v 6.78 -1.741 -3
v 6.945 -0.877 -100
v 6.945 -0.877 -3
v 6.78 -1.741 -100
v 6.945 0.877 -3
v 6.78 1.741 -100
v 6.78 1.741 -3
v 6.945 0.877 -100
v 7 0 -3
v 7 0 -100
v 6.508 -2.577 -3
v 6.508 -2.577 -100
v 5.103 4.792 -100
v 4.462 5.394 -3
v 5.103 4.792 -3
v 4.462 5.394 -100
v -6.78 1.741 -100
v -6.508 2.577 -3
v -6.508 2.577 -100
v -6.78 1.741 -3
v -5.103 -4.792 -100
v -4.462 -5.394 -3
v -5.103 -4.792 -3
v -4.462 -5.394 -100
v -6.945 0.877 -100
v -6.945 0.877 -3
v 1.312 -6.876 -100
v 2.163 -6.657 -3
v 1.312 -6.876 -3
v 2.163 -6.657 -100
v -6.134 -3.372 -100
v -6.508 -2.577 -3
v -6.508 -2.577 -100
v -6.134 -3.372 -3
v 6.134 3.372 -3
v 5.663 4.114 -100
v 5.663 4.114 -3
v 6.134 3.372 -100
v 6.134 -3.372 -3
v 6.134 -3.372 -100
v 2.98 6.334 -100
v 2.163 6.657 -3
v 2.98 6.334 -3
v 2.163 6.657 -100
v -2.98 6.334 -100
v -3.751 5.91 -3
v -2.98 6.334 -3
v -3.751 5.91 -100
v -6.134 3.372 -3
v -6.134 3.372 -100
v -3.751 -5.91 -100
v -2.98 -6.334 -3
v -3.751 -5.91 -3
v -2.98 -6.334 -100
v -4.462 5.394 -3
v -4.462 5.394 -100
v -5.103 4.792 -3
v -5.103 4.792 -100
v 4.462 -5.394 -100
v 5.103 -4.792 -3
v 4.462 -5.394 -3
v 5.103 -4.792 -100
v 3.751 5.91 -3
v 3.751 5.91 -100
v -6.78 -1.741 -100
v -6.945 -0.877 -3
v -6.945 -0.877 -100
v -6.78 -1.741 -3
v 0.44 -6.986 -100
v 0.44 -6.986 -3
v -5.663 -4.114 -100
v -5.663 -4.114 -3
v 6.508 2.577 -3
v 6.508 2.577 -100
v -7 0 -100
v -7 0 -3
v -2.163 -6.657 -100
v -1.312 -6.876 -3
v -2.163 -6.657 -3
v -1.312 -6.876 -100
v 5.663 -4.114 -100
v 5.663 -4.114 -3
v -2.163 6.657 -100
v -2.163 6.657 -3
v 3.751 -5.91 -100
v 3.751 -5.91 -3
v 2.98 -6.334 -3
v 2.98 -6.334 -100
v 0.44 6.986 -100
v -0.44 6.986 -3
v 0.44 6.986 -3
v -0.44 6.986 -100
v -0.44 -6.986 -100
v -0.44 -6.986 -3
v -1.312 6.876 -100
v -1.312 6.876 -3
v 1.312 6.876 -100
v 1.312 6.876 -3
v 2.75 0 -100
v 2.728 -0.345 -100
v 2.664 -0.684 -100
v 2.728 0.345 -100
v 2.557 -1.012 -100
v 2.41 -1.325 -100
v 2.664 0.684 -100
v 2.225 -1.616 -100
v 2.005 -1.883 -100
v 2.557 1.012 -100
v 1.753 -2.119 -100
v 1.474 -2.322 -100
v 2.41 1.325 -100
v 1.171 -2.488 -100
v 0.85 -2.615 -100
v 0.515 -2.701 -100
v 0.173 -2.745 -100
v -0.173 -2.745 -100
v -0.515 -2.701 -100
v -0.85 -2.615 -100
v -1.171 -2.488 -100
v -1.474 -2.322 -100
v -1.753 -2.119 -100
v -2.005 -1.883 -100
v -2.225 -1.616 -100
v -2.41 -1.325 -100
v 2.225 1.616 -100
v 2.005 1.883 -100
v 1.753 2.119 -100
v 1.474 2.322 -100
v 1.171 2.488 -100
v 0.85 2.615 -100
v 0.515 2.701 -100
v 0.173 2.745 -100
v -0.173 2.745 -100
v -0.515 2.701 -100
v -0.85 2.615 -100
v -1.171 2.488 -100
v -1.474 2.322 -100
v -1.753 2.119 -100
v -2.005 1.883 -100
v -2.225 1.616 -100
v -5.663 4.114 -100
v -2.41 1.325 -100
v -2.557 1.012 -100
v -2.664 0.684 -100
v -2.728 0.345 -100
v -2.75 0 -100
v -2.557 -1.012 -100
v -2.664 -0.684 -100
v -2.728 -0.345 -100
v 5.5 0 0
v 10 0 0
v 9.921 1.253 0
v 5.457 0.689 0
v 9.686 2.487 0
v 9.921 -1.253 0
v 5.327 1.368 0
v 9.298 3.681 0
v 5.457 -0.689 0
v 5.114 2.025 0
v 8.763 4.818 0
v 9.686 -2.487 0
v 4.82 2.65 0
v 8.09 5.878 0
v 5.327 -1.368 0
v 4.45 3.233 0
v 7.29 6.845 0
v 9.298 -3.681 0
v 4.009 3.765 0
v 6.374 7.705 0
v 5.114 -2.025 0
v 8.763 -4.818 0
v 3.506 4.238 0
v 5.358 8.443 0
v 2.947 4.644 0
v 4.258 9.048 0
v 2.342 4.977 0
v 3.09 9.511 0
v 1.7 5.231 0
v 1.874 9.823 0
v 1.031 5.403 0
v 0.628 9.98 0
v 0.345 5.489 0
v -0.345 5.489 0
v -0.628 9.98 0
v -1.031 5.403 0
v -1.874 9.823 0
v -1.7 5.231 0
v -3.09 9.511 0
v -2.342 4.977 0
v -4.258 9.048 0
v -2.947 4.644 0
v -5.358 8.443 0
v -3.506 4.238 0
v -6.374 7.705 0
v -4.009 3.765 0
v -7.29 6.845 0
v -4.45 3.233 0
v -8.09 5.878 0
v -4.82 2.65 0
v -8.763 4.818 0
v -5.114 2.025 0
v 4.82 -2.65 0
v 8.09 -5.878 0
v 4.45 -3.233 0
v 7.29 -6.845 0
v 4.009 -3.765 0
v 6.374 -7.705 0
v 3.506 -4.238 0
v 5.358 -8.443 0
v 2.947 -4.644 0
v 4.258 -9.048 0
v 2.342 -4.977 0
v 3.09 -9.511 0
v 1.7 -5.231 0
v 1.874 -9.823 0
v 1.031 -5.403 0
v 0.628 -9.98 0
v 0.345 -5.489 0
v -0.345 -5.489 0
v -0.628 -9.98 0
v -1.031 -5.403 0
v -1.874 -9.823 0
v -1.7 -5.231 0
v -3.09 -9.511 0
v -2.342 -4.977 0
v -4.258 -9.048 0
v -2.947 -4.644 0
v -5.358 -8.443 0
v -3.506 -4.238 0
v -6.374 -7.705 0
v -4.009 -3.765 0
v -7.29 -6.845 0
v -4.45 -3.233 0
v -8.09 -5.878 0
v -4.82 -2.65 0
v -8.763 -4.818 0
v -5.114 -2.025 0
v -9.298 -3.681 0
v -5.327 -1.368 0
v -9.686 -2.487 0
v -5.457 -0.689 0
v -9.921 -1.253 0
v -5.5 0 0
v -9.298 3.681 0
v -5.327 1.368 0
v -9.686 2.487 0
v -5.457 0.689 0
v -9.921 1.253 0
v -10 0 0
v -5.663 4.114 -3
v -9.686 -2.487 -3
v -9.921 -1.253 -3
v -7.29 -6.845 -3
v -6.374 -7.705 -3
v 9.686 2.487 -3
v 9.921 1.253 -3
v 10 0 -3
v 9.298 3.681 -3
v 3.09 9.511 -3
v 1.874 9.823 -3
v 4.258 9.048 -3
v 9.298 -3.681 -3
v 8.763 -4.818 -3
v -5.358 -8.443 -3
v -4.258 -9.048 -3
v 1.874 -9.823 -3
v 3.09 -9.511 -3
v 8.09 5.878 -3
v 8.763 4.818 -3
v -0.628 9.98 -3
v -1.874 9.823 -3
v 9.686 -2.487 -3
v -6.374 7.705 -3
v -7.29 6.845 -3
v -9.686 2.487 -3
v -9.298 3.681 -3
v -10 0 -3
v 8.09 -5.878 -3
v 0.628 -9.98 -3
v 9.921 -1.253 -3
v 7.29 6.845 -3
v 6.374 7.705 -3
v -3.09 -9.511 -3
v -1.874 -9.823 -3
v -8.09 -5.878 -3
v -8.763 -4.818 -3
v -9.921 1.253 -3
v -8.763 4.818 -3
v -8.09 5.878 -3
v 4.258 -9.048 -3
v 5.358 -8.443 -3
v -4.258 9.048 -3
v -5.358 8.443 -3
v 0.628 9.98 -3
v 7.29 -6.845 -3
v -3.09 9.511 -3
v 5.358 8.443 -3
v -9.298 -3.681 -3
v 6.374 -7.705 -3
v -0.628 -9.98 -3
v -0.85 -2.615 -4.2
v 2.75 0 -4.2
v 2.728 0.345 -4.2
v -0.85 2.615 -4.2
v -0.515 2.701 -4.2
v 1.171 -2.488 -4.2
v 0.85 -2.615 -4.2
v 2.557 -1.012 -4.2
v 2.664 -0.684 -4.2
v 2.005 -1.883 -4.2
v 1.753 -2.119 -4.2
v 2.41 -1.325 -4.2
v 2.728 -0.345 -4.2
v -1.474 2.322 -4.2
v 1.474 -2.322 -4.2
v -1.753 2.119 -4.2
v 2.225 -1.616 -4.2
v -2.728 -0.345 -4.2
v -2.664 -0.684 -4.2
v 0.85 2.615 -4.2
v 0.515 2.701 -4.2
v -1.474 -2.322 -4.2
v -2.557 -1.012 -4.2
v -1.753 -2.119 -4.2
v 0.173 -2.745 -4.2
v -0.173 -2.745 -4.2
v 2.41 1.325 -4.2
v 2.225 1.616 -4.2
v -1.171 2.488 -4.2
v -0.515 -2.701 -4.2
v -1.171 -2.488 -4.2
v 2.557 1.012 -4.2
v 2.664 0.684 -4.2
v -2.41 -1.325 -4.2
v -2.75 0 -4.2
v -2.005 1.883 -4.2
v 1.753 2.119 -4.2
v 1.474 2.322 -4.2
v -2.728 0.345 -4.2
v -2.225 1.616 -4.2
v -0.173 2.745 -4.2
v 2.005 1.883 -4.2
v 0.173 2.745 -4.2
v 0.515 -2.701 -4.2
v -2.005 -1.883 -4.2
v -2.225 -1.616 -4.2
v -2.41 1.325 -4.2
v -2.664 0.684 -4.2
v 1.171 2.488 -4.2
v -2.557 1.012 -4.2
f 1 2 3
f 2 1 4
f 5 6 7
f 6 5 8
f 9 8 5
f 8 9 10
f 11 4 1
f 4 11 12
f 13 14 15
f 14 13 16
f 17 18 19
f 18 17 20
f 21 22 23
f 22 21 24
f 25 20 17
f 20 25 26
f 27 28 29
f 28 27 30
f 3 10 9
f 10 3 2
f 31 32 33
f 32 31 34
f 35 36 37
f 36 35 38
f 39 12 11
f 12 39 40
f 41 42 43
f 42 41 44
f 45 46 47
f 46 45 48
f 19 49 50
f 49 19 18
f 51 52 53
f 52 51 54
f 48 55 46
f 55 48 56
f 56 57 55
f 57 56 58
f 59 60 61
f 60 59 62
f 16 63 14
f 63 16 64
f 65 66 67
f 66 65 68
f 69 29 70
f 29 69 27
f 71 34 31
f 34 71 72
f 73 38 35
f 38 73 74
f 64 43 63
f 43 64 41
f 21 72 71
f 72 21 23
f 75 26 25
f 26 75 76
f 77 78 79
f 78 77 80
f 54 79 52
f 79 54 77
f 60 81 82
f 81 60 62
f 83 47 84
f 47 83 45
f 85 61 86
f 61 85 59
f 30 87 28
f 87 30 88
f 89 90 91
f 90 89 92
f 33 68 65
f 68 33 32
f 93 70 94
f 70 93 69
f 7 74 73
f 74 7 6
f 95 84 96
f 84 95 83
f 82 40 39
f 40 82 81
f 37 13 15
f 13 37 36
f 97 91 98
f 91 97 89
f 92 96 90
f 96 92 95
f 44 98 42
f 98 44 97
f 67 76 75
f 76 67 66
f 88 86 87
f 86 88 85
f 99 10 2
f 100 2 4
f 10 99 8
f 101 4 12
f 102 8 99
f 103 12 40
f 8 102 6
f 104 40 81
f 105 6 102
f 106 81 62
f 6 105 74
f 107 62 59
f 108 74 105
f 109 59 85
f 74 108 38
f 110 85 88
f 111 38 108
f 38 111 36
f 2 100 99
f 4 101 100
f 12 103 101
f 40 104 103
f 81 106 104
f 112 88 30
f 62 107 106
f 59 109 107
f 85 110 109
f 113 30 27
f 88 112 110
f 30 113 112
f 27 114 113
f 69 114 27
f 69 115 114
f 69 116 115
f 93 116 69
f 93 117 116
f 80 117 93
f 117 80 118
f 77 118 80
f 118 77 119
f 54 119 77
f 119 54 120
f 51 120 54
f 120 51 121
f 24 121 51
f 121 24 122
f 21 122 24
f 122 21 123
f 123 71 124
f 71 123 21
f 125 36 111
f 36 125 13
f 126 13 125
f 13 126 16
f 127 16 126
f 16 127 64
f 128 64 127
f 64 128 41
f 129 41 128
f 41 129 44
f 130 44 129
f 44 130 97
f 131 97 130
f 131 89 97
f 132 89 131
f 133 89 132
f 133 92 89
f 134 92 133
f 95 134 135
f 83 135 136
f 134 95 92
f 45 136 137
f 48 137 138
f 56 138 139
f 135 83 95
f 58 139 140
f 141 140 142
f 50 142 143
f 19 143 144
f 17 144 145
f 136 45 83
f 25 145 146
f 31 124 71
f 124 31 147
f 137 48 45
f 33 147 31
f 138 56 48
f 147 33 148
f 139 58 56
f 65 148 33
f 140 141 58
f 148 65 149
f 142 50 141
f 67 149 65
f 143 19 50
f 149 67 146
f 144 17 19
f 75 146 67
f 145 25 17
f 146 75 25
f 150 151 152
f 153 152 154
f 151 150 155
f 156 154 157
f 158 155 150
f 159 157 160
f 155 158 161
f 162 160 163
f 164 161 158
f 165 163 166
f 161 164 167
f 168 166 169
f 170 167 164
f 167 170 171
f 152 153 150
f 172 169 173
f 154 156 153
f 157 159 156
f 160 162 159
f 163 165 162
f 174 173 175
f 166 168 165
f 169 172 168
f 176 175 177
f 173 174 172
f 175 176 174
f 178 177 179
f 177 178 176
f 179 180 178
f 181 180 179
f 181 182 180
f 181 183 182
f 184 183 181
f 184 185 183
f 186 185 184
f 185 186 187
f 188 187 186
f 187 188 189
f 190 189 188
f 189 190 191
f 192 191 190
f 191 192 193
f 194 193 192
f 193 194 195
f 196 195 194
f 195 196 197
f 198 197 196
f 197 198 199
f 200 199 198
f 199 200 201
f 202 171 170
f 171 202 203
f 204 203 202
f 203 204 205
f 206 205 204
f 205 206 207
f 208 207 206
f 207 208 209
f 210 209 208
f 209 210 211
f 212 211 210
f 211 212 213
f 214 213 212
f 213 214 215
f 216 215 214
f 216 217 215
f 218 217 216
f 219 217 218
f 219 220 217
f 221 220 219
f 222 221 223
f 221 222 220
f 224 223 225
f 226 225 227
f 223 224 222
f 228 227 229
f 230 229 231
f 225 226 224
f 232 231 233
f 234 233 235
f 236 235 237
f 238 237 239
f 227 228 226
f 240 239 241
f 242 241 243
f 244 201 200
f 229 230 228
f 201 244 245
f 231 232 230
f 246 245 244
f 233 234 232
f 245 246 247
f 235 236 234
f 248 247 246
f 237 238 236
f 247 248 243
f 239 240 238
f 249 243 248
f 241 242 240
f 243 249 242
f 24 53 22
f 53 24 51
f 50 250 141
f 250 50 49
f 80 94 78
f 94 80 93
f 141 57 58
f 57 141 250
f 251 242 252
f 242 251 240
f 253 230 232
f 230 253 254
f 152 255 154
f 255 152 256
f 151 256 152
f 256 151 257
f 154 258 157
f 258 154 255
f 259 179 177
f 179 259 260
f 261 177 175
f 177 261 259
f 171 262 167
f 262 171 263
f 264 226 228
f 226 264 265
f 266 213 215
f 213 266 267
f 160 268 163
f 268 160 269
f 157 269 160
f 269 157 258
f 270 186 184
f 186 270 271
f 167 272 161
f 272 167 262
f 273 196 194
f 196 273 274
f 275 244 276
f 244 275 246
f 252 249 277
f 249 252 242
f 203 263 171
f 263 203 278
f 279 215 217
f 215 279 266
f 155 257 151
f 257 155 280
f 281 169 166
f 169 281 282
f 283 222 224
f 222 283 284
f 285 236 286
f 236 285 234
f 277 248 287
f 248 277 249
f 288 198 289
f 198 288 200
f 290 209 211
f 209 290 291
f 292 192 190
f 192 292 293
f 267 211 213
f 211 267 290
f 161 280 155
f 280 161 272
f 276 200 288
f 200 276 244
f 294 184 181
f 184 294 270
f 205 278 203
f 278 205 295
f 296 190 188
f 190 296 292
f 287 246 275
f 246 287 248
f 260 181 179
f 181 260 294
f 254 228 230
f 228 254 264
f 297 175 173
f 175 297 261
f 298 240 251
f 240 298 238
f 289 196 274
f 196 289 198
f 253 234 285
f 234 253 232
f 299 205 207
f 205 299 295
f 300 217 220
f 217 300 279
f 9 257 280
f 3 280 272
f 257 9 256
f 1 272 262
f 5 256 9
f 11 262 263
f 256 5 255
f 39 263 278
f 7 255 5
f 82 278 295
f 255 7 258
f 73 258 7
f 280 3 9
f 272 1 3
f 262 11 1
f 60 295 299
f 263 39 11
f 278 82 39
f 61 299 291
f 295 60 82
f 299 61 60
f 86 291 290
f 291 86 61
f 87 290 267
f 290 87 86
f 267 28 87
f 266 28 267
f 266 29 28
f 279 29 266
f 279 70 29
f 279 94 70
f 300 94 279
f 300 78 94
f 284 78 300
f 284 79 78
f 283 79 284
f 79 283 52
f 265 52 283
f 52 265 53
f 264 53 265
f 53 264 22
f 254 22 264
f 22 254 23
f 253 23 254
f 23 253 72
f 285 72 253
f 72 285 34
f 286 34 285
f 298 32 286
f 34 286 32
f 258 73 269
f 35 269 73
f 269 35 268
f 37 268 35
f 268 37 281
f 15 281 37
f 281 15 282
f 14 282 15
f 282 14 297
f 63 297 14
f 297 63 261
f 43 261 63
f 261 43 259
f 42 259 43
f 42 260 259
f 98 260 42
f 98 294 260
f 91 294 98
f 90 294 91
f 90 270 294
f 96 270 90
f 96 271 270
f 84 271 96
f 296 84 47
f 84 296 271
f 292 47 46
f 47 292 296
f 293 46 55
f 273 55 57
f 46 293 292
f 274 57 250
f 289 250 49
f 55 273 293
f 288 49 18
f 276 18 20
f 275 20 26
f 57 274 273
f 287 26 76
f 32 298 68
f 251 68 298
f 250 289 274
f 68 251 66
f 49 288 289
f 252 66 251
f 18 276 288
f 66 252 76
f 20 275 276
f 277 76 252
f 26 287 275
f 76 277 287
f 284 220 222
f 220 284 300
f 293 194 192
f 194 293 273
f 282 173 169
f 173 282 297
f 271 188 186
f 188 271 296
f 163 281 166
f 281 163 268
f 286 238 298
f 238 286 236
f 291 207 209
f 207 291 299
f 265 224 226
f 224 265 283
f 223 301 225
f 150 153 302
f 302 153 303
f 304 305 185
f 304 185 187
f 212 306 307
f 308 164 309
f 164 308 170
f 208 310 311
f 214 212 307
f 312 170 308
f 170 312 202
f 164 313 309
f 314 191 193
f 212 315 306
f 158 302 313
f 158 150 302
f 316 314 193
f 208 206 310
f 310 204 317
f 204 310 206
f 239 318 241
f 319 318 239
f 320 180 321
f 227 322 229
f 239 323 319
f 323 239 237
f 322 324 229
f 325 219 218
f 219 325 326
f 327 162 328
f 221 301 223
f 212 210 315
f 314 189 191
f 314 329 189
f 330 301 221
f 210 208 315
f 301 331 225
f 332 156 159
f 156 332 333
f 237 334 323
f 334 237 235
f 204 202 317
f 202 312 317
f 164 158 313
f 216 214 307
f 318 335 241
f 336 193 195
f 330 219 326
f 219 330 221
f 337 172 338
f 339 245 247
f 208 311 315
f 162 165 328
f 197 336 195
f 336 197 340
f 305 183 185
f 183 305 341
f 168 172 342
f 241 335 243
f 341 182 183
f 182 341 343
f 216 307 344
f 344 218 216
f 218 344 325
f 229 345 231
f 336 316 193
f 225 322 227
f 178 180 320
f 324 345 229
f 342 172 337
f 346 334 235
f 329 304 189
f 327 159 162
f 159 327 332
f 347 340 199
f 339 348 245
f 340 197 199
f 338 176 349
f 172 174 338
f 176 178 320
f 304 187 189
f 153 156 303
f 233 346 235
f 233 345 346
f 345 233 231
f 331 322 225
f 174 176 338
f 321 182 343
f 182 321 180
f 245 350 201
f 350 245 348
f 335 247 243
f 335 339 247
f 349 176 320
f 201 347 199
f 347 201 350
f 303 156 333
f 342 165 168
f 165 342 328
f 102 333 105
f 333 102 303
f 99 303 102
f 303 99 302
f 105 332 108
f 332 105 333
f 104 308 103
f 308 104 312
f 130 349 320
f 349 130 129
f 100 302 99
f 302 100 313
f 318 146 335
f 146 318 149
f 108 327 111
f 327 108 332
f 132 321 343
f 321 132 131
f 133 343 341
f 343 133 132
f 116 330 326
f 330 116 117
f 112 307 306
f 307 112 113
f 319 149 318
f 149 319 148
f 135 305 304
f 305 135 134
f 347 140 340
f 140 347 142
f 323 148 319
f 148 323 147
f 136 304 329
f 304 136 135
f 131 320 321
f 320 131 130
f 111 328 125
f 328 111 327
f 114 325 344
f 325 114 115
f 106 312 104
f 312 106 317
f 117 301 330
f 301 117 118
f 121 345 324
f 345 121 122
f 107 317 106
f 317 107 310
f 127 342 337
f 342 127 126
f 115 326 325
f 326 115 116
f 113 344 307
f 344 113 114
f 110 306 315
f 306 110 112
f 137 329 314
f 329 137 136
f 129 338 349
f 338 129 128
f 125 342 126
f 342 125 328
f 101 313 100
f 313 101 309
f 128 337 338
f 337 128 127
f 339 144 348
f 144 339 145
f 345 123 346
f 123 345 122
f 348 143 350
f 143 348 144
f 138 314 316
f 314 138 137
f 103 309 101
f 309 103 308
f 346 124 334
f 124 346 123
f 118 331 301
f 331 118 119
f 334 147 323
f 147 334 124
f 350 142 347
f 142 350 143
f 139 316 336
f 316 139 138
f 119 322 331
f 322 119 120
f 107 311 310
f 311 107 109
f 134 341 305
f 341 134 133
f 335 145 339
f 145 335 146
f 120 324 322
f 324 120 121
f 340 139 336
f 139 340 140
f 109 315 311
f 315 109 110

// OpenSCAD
$fn = 50;


difference() {
	union() {
		translate(v = [0, 0, -100.0000000000]) {
			cylinder(h = 100, r = 7.0000000000);
		}
		translate(v = [0, 0, -3.0000000000]) {
			cylinder(h = 3, r = 10.0000000000);
		}
	}
	union() {
		translate(v = [0, 0, 0]) {
			rotate(a = [0, 0, 0]) {
				difference() {
					union() {
						#translate(v = [0, 0, -100.0000000000]) {
							cylinder(h = 100, r = 2.2500000000);
						}
						#translate(v = [0, 0, -4.2000000000]) {
							cylinder(h = 4.2000000000, r = 7.0000000000, r1 = 2.7500000000, r2 = 5.5000000000);
						}
						#translate(v = [0, 0, -100.0000000000]) {
							cylinder(h = 100, r = 2.7500000000);
						}
						#translate(v = [0, 0, -100.0000000000]) {
							cylinder(h = 100, r = 2.2500000000);
						}
					}
					union();
				}
			}
		}
	}
}
